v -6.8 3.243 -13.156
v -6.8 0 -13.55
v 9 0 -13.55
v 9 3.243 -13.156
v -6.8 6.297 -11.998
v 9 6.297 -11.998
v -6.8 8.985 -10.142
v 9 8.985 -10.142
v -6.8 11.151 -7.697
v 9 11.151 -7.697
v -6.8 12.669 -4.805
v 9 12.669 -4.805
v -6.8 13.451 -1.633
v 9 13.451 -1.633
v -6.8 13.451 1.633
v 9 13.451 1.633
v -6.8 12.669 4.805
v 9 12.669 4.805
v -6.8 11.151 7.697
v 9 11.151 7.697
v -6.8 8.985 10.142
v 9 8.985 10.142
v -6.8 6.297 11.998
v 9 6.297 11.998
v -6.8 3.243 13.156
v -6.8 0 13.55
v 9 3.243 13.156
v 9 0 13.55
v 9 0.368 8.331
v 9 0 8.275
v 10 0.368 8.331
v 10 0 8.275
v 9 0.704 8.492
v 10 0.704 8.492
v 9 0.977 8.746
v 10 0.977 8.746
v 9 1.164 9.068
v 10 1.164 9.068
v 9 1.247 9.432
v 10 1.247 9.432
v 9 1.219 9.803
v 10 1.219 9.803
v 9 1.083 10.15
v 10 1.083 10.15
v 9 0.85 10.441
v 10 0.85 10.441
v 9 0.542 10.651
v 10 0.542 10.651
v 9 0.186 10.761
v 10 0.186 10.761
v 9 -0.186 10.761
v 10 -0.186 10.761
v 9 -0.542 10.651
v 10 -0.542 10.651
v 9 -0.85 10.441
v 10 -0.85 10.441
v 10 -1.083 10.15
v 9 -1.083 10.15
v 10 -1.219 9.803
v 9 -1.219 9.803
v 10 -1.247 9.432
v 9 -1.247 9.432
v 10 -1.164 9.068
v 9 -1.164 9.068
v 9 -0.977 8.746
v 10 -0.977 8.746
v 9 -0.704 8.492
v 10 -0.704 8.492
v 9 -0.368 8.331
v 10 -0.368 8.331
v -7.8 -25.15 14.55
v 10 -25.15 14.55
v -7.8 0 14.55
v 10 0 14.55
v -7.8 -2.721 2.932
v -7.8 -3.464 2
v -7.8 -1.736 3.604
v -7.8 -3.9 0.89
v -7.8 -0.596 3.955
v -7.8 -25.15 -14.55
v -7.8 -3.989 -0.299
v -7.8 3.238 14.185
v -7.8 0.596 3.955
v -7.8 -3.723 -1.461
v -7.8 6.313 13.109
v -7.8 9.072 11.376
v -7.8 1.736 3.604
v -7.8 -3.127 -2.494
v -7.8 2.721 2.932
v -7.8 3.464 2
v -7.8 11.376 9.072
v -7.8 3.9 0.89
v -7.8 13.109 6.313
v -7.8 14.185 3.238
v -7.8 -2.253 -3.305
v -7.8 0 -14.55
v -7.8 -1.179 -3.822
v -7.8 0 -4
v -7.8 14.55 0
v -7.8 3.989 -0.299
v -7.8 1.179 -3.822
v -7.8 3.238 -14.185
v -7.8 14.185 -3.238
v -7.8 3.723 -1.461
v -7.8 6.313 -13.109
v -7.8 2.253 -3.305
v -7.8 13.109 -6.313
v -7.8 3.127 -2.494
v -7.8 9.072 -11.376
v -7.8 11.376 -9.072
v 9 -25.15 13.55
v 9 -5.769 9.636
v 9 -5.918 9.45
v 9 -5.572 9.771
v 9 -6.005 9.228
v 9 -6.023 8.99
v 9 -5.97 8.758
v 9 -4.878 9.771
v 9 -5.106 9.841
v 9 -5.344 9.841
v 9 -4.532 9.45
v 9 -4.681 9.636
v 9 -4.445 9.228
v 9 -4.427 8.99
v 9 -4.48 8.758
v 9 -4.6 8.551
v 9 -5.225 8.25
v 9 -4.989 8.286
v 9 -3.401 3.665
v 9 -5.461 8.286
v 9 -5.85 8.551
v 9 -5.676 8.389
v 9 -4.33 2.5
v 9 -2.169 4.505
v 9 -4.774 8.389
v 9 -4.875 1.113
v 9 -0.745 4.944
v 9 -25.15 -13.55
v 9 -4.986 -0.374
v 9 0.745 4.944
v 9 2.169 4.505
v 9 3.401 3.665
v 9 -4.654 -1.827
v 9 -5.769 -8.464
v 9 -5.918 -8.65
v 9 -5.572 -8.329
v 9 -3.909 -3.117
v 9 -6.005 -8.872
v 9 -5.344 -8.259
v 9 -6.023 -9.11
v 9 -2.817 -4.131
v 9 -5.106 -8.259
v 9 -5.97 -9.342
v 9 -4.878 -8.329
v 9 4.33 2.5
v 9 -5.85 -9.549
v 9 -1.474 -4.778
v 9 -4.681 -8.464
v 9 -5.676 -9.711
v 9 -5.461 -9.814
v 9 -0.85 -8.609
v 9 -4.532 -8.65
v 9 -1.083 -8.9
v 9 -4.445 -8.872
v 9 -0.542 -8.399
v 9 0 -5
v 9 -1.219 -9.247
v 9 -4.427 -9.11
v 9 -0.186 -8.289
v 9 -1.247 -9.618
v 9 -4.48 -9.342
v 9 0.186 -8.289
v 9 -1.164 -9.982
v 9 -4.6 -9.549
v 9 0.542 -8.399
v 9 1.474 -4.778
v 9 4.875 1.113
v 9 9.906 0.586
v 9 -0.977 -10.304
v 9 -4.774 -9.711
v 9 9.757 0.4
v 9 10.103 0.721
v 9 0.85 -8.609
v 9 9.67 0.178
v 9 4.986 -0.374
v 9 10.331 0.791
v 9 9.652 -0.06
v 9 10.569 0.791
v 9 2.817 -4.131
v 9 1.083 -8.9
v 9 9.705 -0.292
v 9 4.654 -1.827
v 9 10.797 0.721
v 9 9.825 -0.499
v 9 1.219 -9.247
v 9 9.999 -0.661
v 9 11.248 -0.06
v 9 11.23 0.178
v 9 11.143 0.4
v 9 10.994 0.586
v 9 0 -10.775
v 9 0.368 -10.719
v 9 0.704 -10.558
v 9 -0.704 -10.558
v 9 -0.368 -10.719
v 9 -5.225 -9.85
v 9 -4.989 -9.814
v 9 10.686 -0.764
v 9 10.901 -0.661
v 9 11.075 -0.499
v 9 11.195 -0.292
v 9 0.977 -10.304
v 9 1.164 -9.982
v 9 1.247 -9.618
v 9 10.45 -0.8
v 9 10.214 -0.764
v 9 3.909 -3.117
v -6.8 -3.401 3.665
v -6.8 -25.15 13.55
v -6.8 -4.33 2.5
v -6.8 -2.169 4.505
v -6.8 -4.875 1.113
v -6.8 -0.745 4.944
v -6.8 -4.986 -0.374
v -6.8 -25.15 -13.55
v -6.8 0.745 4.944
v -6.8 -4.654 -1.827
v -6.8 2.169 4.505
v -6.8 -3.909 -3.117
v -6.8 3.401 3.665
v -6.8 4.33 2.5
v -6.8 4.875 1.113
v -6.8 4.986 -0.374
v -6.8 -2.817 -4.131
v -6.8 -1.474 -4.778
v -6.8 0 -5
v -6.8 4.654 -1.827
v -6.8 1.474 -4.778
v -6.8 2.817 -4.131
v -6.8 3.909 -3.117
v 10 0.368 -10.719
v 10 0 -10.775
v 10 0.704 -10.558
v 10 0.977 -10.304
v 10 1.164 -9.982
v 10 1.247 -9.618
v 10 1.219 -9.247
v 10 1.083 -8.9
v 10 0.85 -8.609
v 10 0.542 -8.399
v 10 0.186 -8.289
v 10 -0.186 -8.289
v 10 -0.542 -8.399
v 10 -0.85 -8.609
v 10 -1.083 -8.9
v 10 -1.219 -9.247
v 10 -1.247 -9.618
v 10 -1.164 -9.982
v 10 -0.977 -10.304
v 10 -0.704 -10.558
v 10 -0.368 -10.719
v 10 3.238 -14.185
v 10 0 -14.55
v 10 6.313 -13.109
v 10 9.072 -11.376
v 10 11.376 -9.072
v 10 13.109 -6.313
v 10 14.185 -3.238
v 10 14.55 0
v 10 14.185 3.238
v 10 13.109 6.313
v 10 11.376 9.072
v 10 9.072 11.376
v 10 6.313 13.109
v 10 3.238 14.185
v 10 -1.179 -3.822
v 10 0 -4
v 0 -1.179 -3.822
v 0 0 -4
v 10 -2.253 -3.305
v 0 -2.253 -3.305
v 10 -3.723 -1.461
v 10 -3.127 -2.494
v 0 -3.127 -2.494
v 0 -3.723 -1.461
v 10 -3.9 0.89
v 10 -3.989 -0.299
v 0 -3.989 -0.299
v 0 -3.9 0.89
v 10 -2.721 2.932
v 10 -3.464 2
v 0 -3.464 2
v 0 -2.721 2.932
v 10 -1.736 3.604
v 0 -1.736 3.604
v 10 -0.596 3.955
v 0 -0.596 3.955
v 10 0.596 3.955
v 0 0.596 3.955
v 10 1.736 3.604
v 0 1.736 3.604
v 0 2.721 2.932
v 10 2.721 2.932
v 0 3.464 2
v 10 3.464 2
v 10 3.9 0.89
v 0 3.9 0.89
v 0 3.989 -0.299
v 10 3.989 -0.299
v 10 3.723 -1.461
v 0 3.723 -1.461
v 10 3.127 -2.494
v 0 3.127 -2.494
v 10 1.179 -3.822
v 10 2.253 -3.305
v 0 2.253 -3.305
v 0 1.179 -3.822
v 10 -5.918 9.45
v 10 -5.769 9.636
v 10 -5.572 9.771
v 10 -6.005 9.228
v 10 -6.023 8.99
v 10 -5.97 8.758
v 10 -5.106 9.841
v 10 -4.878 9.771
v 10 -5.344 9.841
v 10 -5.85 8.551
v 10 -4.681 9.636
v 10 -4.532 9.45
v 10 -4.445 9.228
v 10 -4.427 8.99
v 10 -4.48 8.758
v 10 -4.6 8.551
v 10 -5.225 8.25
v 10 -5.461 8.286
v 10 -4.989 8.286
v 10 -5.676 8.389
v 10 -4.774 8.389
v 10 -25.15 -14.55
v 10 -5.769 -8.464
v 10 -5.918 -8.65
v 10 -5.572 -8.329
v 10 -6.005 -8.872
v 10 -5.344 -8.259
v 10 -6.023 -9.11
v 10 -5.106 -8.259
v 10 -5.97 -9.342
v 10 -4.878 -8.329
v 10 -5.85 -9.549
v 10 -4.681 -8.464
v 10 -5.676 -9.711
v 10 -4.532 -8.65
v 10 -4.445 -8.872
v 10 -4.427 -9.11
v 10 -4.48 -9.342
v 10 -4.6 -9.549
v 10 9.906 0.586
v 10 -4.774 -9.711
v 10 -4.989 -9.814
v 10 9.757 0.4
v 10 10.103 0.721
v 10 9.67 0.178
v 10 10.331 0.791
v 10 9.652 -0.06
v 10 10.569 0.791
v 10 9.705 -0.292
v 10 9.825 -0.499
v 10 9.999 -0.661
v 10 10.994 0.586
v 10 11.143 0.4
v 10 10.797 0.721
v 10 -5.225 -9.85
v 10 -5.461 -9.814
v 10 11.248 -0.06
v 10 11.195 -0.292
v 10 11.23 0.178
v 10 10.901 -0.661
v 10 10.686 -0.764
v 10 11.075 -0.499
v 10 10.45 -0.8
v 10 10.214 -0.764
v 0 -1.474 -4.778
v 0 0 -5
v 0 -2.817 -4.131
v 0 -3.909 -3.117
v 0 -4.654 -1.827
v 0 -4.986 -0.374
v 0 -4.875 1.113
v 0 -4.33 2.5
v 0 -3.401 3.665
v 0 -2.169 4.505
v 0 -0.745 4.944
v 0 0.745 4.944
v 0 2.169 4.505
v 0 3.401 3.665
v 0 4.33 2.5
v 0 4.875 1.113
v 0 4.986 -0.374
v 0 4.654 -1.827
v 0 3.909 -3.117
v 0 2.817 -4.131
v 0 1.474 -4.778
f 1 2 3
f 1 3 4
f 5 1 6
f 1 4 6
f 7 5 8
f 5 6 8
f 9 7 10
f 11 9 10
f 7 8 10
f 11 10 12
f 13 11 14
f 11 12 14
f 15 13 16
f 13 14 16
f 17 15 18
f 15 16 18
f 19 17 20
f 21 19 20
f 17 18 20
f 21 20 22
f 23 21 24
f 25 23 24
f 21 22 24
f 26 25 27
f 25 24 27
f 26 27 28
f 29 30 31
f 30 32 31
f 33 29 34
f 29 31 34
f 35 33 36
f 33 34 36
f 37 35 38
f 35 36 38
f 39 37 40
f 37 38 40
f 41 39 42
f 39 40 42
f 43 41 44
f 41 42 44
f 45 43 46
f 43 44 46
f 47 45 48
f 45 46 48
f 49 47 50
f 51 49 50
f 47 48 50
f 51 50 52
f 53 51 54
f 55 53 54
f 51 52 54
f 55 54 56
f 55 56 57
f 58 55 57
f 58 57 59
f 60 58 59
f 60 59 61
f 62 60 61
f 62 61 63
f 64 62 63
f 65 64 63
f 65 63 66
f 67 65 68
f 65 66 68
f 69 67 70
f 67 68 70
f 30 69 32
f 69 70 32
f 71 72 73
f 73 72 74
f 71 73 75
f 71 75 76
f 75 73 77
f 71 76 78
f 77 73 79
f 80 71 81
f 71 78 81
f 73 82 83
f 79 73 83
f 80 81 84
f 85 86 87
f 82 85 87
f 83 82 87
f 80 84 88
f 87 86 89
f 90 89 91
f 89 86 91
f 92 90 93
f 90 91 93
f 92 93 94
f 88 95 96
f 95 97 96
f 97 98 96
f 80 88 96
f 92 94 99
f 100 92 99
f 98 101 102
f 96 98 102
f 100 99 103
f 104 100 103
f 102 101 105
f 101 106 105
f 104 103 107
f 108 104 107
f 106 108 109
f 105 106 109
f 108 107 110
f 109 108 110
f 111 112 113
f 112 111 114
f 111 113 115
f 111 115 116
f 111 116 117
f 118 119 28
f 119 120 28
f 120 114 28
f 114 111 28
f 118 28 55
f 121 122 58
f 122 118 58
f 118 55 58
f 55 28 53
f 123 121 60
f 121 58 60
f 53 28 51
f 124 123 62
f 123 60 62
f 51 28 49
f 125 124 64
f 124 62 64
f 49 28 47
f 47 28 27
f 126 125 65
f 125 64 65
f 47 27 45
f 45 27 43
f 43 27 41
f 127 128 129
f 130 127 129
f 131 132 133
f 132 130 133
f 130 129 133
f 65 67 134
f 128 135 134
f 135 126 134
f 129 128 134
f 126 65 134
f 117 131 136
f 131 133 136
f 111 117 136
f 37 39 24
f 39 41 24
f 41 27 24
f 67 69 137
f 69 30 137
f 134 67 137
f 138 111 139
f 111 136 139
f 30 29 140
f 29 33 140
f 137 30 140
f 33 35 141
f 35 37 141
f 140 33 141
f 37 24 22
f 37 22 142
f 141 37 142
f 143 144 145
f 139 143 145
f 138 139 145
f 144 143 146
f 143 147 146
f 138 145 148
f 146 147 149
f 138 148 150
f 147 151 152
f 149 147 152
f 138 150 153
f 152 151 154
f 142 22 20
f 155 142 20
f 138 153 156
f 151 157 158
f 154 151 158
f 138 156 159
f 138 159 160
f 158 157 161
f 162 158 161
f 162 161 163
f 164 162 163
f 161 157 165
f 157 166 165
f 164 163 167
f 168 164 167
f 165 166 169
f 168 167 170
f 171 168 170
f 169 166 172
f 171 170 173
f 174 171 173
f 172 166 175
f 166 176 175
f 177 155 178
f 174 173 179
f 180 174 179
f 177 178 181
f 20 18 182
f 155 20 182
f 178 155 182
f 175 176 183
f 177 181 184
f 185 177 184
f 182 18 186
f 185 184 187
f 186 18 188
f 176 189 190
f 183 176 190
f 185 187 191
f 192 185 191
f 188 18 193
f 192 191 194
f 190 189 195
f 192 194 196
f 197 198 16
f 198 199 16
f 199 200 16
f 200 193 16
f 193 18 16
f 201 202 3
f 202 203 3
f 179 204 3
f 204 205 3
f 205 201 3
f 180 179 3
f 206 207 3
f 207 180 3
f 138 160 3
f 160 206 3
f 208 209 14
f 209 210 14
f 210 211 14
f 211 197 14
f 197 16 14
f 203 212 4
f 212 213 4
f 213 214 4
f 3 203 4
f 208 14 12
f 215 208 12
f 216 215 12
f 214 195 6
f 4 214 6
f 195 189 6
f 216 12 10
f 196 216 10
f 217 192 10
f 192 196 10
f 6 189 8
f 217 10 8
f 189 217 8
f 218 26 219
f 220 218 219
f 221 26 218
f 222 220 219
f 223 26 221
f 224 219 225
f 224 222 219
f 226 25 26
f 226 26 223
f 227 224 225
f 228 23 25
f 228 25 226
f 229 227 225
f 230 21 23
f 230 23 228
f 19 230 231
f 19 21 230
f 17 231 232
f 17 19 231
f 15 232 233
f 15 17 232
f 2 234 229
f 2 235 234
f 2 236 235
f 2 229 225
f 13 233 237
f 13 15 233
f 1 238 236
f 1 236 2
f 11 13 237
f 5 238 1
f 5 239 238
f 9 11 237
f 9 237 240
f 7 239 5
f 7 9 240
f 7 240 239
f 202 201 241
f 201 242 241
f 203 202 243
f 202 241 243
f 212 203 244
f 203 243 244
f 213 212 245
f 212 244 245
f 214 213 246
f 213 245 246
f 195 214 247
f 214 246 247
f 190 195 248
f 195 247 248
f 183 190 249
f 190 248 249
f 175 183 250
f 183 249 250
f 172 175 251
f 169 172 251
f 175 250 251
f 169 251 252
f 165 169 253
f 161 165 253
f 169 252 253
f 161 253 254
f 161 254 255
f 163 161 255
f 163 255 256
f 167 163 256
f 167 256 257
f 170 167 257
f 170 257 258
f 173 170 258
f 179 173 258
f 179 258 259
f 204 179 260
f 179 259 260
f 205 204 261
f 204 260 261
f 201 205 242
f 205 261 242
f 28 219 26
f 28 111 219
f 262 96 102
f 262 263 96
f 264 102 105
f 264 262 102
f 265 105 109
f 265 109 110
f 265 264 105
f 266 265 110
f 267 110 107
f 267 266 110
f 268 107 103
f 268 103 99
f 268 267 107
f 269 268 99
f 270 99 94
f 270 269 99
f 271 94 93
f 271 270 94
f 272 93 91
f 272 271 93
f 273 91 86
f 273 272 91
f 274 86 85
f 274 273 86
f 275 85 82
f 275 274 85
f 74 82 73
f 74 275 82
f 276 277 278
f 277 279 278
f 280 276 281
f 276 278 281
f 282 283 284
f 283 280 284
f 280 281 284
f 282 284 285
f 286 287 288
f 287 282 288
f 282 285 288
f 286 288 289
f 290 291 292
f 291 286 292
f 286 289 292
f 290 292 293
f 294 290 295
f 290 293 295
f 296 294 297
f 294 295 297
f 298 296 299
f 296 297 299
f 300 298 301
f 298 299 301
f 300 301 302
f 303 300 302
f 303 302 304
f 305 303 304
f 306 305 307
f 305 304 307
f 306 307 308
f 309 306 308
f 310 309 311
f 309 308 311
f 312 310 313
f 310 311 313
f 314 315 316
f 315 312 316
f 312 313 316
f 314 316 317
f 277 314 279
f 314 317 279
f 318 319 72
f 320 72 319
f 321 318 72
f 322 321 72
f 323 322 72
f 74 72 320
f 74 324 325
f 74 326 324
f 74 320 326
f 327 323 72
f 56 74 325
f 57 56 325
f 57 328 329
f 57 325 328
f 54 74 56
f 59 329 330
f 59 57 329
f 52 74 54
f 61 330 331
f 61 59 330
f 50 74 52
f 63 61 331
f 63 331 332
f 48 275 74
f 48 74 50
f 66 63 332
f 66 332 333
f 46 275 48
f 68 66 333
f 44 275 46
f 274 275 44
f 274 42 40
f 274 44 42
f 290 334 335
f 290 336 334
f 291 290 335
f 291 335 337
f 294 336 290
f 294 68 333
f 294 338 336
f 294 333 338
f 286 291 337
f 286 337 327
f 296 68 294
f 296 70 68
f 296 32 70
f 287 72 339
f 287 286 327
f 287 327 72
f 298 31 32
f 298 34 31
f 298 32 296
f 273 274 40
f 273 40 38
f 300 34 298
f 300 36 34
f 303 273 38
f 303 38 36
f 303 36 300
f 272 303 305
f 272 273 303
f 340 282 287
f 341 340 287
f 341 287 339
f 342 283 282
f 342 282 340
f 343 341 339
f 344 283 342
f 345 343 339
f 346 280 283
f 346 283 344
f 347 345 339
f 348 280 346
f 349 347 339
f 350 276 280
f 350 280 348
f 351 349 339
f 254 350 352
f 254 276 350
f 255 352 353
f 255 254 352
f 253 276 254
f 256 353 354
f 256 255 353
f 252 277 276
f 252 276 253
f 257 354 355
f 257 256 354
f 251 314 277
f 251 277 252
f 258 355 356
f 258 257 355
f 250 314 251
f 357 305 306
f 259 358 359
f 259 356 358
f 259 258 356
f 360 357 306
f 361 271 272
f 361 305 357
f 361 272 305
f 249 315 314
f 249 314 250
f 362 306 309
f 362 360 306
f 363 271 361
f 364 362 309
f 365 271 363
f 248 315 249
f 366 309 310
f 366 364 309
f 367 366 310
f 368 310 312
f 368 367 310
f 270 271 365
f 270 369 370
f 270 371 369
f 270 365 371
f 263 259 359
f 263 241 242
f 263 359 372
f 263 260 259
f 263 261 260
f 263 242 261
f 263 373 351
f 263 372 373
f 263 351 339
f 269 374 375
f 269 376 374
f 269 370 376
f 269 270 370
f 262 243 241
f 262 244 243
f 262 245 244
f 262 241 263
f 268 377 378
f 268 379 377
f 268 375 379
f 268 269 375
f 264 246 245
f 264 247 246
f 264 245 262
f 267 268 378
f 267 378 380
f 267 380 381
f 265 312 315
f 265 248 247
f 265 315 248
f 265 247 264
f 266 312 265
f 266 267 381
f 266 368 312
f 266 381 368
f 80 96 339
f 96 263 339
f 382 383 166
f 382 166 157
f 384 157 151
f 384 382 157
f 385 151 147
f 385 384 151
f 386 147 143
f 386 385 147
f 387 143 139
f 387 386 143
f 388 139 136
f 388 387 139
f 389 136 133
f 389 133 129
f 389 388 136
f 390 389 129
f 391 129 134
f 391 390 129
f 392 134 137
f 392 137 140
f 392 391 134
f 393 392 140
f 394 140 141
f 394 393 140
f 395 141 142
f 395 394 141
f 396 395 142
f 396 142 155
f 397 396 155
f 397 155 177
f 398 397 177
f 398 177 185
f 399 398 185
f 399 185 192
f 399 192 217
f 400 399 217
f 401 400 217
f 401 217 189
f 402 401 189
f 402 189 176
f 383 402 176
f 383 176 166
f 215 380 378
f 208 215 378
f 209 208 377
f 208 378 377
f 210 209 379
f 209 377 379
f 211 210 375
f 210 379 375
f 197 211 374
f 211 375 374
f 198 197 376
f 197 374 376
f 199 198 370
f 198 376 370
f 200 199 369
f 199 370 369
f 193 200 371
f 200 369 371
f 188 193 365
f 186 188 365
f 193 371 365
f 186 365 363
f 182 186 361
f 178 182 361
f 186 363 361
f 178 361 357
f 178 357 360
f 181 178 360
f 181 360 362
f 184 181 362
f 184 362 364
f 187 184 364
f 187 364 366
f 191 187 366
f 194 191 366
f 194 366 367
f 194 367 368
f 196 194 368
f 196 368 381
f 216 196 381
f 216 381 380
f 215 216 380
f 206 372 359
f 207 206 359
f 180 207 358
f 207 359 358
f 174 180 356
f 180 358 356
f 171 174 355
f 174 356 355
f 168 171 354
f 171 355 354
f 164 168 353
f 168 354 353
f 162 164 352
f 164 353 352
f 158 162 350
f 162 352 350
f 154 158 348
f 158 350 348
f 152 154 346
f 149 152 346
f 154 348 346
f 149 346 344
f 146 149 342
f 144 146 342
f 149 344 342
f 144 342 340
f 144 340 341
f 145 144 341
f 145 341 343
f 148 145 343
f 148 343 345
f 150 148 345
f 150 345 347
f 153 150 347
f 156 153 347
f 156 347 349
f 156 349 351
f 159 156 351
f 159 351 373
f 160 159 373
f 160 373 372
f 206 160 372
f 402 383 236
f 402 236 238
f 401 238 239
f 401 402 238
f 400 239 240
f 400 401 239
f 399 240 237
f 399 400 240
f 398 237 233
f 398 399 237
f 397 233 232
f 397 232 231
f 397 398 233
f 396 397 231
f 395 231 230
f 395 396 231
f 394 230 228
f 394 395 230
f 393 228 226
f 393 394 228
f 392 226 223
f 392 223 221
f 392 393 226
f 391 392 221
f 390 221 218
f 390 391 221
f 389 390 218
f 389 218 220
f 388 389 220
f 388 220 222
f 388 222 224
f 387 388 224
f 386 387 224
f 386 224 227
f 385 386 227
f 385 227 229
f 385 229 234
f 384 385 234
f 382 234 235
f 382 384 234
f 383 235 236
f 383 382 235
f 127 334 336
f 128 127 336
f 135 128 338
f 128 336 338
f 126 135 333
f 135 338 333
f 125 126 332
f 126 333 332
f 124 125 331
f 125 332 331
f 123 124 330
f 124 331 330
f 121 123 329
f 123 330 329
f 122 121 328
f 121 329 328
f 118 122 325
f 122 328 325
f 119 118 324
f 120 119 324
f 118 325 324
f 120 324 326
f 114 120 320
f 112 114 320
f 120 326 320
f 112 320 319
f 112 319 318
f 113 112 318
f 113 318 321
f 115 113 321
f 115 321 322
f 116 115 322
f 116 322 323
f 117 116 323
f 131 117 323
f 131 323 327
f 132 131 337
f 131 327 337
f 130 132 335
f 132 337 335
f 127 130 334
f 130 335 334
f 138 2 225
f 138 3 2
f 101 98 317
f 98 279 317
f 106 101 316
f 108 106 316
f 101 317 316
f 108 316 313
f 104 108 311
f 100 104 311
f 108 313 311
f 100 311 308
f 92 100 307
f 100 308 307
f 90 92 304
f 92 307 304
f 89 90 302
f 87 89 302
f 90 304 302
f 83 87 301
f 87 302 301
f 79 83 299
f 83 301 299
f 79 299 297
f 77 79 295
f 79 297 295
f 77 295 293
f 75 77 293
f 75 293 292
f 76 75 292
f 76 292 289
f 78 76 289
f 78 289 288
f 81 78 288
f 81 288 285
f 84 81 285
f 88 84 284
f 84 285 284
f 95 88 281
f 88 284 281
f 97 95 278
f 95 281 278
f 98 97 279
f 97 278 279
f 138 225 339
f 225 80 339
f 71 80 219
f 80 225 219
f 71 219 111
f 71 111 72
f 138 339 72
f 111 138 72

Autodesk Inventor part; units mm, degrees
ref_plane "YZ Plane" through (0, 0, 0) normal (1, 0, 0) x (0, 1, 0)
ref_plane "XZ Plane" through (0, 0, 0) normal (0, 1, 0) x (-1, 0, 0)
ref_plane "Arbeitsebene1" through (0, 0, 0) normal (1, 0, 0) x (0, 0, -1)
sketch "Skizze1" plane through (0, 0, 0) normal (1, 0, 0) x (0, 0, -1)
  arc A0 (14.55, 0) -> (-14.55, 0) centre (0, 0) ccw
  line L0 (14.55, 0) -> (14.55, -25.15)
  line L1 (14.55, -25.15) -> (-14.55, -25.15)
  line L2 (-14.55, -25.15) -> (-14.55, 0)
  circle A1 centre (0, 0) radius 4
  line L3 (-20.37, 0) -> (20.37, 0) construction
  line L4 (0, -33.09) -> (0, 22.49) construction
  circle A2 centre (0, 10.45) radius 0.8
  circle A3 centre (9.525, 0) radius 1.25
  circle A4 centre (-9.525, 0) radius 1.25
  circle A5 centre (-9.05, -5.225) radius 0.8
  circle A6 centre (9.05, -5.225) radius 0.8
  circle A7 centre (0, 0) radius 10.45 construction
  line L5 (0, 0) -> (9.05, -5.225) construction
  line L6 (0, 0) -> (-9.05, -5.225) construction
  circle A8 centre (0, 0) radius 9.525 construction
  point P0 (0, 14.55)
  dimension "d0" = 29.1
  dimension "d1" = 39.7
  dimension "d2" = 8
  dimension "d9" = 1.6
  dimension "d11" = 120
  dimension "d12" = 20.9
  dimension "d13" = 2.5
  dimension "d14" = 19.05
extrude "Extrusion1" add sketch "Skizze1" along normal blind 10 and the other way blind 7.8 contours L0 L1 L2 A0 | A2 | A3 | A4 | A5 | A6
shell "Wandung1" thickness 1 removed faces 1 at (4.0667, -25.15, -4.85)
extrude "Extrusion2" cut sketch "Skizze1" against normal blind 10 from surface at 10 contours A2 | A3 | A4 | A5 | A6
properties part number "EncoderEnclosure"
